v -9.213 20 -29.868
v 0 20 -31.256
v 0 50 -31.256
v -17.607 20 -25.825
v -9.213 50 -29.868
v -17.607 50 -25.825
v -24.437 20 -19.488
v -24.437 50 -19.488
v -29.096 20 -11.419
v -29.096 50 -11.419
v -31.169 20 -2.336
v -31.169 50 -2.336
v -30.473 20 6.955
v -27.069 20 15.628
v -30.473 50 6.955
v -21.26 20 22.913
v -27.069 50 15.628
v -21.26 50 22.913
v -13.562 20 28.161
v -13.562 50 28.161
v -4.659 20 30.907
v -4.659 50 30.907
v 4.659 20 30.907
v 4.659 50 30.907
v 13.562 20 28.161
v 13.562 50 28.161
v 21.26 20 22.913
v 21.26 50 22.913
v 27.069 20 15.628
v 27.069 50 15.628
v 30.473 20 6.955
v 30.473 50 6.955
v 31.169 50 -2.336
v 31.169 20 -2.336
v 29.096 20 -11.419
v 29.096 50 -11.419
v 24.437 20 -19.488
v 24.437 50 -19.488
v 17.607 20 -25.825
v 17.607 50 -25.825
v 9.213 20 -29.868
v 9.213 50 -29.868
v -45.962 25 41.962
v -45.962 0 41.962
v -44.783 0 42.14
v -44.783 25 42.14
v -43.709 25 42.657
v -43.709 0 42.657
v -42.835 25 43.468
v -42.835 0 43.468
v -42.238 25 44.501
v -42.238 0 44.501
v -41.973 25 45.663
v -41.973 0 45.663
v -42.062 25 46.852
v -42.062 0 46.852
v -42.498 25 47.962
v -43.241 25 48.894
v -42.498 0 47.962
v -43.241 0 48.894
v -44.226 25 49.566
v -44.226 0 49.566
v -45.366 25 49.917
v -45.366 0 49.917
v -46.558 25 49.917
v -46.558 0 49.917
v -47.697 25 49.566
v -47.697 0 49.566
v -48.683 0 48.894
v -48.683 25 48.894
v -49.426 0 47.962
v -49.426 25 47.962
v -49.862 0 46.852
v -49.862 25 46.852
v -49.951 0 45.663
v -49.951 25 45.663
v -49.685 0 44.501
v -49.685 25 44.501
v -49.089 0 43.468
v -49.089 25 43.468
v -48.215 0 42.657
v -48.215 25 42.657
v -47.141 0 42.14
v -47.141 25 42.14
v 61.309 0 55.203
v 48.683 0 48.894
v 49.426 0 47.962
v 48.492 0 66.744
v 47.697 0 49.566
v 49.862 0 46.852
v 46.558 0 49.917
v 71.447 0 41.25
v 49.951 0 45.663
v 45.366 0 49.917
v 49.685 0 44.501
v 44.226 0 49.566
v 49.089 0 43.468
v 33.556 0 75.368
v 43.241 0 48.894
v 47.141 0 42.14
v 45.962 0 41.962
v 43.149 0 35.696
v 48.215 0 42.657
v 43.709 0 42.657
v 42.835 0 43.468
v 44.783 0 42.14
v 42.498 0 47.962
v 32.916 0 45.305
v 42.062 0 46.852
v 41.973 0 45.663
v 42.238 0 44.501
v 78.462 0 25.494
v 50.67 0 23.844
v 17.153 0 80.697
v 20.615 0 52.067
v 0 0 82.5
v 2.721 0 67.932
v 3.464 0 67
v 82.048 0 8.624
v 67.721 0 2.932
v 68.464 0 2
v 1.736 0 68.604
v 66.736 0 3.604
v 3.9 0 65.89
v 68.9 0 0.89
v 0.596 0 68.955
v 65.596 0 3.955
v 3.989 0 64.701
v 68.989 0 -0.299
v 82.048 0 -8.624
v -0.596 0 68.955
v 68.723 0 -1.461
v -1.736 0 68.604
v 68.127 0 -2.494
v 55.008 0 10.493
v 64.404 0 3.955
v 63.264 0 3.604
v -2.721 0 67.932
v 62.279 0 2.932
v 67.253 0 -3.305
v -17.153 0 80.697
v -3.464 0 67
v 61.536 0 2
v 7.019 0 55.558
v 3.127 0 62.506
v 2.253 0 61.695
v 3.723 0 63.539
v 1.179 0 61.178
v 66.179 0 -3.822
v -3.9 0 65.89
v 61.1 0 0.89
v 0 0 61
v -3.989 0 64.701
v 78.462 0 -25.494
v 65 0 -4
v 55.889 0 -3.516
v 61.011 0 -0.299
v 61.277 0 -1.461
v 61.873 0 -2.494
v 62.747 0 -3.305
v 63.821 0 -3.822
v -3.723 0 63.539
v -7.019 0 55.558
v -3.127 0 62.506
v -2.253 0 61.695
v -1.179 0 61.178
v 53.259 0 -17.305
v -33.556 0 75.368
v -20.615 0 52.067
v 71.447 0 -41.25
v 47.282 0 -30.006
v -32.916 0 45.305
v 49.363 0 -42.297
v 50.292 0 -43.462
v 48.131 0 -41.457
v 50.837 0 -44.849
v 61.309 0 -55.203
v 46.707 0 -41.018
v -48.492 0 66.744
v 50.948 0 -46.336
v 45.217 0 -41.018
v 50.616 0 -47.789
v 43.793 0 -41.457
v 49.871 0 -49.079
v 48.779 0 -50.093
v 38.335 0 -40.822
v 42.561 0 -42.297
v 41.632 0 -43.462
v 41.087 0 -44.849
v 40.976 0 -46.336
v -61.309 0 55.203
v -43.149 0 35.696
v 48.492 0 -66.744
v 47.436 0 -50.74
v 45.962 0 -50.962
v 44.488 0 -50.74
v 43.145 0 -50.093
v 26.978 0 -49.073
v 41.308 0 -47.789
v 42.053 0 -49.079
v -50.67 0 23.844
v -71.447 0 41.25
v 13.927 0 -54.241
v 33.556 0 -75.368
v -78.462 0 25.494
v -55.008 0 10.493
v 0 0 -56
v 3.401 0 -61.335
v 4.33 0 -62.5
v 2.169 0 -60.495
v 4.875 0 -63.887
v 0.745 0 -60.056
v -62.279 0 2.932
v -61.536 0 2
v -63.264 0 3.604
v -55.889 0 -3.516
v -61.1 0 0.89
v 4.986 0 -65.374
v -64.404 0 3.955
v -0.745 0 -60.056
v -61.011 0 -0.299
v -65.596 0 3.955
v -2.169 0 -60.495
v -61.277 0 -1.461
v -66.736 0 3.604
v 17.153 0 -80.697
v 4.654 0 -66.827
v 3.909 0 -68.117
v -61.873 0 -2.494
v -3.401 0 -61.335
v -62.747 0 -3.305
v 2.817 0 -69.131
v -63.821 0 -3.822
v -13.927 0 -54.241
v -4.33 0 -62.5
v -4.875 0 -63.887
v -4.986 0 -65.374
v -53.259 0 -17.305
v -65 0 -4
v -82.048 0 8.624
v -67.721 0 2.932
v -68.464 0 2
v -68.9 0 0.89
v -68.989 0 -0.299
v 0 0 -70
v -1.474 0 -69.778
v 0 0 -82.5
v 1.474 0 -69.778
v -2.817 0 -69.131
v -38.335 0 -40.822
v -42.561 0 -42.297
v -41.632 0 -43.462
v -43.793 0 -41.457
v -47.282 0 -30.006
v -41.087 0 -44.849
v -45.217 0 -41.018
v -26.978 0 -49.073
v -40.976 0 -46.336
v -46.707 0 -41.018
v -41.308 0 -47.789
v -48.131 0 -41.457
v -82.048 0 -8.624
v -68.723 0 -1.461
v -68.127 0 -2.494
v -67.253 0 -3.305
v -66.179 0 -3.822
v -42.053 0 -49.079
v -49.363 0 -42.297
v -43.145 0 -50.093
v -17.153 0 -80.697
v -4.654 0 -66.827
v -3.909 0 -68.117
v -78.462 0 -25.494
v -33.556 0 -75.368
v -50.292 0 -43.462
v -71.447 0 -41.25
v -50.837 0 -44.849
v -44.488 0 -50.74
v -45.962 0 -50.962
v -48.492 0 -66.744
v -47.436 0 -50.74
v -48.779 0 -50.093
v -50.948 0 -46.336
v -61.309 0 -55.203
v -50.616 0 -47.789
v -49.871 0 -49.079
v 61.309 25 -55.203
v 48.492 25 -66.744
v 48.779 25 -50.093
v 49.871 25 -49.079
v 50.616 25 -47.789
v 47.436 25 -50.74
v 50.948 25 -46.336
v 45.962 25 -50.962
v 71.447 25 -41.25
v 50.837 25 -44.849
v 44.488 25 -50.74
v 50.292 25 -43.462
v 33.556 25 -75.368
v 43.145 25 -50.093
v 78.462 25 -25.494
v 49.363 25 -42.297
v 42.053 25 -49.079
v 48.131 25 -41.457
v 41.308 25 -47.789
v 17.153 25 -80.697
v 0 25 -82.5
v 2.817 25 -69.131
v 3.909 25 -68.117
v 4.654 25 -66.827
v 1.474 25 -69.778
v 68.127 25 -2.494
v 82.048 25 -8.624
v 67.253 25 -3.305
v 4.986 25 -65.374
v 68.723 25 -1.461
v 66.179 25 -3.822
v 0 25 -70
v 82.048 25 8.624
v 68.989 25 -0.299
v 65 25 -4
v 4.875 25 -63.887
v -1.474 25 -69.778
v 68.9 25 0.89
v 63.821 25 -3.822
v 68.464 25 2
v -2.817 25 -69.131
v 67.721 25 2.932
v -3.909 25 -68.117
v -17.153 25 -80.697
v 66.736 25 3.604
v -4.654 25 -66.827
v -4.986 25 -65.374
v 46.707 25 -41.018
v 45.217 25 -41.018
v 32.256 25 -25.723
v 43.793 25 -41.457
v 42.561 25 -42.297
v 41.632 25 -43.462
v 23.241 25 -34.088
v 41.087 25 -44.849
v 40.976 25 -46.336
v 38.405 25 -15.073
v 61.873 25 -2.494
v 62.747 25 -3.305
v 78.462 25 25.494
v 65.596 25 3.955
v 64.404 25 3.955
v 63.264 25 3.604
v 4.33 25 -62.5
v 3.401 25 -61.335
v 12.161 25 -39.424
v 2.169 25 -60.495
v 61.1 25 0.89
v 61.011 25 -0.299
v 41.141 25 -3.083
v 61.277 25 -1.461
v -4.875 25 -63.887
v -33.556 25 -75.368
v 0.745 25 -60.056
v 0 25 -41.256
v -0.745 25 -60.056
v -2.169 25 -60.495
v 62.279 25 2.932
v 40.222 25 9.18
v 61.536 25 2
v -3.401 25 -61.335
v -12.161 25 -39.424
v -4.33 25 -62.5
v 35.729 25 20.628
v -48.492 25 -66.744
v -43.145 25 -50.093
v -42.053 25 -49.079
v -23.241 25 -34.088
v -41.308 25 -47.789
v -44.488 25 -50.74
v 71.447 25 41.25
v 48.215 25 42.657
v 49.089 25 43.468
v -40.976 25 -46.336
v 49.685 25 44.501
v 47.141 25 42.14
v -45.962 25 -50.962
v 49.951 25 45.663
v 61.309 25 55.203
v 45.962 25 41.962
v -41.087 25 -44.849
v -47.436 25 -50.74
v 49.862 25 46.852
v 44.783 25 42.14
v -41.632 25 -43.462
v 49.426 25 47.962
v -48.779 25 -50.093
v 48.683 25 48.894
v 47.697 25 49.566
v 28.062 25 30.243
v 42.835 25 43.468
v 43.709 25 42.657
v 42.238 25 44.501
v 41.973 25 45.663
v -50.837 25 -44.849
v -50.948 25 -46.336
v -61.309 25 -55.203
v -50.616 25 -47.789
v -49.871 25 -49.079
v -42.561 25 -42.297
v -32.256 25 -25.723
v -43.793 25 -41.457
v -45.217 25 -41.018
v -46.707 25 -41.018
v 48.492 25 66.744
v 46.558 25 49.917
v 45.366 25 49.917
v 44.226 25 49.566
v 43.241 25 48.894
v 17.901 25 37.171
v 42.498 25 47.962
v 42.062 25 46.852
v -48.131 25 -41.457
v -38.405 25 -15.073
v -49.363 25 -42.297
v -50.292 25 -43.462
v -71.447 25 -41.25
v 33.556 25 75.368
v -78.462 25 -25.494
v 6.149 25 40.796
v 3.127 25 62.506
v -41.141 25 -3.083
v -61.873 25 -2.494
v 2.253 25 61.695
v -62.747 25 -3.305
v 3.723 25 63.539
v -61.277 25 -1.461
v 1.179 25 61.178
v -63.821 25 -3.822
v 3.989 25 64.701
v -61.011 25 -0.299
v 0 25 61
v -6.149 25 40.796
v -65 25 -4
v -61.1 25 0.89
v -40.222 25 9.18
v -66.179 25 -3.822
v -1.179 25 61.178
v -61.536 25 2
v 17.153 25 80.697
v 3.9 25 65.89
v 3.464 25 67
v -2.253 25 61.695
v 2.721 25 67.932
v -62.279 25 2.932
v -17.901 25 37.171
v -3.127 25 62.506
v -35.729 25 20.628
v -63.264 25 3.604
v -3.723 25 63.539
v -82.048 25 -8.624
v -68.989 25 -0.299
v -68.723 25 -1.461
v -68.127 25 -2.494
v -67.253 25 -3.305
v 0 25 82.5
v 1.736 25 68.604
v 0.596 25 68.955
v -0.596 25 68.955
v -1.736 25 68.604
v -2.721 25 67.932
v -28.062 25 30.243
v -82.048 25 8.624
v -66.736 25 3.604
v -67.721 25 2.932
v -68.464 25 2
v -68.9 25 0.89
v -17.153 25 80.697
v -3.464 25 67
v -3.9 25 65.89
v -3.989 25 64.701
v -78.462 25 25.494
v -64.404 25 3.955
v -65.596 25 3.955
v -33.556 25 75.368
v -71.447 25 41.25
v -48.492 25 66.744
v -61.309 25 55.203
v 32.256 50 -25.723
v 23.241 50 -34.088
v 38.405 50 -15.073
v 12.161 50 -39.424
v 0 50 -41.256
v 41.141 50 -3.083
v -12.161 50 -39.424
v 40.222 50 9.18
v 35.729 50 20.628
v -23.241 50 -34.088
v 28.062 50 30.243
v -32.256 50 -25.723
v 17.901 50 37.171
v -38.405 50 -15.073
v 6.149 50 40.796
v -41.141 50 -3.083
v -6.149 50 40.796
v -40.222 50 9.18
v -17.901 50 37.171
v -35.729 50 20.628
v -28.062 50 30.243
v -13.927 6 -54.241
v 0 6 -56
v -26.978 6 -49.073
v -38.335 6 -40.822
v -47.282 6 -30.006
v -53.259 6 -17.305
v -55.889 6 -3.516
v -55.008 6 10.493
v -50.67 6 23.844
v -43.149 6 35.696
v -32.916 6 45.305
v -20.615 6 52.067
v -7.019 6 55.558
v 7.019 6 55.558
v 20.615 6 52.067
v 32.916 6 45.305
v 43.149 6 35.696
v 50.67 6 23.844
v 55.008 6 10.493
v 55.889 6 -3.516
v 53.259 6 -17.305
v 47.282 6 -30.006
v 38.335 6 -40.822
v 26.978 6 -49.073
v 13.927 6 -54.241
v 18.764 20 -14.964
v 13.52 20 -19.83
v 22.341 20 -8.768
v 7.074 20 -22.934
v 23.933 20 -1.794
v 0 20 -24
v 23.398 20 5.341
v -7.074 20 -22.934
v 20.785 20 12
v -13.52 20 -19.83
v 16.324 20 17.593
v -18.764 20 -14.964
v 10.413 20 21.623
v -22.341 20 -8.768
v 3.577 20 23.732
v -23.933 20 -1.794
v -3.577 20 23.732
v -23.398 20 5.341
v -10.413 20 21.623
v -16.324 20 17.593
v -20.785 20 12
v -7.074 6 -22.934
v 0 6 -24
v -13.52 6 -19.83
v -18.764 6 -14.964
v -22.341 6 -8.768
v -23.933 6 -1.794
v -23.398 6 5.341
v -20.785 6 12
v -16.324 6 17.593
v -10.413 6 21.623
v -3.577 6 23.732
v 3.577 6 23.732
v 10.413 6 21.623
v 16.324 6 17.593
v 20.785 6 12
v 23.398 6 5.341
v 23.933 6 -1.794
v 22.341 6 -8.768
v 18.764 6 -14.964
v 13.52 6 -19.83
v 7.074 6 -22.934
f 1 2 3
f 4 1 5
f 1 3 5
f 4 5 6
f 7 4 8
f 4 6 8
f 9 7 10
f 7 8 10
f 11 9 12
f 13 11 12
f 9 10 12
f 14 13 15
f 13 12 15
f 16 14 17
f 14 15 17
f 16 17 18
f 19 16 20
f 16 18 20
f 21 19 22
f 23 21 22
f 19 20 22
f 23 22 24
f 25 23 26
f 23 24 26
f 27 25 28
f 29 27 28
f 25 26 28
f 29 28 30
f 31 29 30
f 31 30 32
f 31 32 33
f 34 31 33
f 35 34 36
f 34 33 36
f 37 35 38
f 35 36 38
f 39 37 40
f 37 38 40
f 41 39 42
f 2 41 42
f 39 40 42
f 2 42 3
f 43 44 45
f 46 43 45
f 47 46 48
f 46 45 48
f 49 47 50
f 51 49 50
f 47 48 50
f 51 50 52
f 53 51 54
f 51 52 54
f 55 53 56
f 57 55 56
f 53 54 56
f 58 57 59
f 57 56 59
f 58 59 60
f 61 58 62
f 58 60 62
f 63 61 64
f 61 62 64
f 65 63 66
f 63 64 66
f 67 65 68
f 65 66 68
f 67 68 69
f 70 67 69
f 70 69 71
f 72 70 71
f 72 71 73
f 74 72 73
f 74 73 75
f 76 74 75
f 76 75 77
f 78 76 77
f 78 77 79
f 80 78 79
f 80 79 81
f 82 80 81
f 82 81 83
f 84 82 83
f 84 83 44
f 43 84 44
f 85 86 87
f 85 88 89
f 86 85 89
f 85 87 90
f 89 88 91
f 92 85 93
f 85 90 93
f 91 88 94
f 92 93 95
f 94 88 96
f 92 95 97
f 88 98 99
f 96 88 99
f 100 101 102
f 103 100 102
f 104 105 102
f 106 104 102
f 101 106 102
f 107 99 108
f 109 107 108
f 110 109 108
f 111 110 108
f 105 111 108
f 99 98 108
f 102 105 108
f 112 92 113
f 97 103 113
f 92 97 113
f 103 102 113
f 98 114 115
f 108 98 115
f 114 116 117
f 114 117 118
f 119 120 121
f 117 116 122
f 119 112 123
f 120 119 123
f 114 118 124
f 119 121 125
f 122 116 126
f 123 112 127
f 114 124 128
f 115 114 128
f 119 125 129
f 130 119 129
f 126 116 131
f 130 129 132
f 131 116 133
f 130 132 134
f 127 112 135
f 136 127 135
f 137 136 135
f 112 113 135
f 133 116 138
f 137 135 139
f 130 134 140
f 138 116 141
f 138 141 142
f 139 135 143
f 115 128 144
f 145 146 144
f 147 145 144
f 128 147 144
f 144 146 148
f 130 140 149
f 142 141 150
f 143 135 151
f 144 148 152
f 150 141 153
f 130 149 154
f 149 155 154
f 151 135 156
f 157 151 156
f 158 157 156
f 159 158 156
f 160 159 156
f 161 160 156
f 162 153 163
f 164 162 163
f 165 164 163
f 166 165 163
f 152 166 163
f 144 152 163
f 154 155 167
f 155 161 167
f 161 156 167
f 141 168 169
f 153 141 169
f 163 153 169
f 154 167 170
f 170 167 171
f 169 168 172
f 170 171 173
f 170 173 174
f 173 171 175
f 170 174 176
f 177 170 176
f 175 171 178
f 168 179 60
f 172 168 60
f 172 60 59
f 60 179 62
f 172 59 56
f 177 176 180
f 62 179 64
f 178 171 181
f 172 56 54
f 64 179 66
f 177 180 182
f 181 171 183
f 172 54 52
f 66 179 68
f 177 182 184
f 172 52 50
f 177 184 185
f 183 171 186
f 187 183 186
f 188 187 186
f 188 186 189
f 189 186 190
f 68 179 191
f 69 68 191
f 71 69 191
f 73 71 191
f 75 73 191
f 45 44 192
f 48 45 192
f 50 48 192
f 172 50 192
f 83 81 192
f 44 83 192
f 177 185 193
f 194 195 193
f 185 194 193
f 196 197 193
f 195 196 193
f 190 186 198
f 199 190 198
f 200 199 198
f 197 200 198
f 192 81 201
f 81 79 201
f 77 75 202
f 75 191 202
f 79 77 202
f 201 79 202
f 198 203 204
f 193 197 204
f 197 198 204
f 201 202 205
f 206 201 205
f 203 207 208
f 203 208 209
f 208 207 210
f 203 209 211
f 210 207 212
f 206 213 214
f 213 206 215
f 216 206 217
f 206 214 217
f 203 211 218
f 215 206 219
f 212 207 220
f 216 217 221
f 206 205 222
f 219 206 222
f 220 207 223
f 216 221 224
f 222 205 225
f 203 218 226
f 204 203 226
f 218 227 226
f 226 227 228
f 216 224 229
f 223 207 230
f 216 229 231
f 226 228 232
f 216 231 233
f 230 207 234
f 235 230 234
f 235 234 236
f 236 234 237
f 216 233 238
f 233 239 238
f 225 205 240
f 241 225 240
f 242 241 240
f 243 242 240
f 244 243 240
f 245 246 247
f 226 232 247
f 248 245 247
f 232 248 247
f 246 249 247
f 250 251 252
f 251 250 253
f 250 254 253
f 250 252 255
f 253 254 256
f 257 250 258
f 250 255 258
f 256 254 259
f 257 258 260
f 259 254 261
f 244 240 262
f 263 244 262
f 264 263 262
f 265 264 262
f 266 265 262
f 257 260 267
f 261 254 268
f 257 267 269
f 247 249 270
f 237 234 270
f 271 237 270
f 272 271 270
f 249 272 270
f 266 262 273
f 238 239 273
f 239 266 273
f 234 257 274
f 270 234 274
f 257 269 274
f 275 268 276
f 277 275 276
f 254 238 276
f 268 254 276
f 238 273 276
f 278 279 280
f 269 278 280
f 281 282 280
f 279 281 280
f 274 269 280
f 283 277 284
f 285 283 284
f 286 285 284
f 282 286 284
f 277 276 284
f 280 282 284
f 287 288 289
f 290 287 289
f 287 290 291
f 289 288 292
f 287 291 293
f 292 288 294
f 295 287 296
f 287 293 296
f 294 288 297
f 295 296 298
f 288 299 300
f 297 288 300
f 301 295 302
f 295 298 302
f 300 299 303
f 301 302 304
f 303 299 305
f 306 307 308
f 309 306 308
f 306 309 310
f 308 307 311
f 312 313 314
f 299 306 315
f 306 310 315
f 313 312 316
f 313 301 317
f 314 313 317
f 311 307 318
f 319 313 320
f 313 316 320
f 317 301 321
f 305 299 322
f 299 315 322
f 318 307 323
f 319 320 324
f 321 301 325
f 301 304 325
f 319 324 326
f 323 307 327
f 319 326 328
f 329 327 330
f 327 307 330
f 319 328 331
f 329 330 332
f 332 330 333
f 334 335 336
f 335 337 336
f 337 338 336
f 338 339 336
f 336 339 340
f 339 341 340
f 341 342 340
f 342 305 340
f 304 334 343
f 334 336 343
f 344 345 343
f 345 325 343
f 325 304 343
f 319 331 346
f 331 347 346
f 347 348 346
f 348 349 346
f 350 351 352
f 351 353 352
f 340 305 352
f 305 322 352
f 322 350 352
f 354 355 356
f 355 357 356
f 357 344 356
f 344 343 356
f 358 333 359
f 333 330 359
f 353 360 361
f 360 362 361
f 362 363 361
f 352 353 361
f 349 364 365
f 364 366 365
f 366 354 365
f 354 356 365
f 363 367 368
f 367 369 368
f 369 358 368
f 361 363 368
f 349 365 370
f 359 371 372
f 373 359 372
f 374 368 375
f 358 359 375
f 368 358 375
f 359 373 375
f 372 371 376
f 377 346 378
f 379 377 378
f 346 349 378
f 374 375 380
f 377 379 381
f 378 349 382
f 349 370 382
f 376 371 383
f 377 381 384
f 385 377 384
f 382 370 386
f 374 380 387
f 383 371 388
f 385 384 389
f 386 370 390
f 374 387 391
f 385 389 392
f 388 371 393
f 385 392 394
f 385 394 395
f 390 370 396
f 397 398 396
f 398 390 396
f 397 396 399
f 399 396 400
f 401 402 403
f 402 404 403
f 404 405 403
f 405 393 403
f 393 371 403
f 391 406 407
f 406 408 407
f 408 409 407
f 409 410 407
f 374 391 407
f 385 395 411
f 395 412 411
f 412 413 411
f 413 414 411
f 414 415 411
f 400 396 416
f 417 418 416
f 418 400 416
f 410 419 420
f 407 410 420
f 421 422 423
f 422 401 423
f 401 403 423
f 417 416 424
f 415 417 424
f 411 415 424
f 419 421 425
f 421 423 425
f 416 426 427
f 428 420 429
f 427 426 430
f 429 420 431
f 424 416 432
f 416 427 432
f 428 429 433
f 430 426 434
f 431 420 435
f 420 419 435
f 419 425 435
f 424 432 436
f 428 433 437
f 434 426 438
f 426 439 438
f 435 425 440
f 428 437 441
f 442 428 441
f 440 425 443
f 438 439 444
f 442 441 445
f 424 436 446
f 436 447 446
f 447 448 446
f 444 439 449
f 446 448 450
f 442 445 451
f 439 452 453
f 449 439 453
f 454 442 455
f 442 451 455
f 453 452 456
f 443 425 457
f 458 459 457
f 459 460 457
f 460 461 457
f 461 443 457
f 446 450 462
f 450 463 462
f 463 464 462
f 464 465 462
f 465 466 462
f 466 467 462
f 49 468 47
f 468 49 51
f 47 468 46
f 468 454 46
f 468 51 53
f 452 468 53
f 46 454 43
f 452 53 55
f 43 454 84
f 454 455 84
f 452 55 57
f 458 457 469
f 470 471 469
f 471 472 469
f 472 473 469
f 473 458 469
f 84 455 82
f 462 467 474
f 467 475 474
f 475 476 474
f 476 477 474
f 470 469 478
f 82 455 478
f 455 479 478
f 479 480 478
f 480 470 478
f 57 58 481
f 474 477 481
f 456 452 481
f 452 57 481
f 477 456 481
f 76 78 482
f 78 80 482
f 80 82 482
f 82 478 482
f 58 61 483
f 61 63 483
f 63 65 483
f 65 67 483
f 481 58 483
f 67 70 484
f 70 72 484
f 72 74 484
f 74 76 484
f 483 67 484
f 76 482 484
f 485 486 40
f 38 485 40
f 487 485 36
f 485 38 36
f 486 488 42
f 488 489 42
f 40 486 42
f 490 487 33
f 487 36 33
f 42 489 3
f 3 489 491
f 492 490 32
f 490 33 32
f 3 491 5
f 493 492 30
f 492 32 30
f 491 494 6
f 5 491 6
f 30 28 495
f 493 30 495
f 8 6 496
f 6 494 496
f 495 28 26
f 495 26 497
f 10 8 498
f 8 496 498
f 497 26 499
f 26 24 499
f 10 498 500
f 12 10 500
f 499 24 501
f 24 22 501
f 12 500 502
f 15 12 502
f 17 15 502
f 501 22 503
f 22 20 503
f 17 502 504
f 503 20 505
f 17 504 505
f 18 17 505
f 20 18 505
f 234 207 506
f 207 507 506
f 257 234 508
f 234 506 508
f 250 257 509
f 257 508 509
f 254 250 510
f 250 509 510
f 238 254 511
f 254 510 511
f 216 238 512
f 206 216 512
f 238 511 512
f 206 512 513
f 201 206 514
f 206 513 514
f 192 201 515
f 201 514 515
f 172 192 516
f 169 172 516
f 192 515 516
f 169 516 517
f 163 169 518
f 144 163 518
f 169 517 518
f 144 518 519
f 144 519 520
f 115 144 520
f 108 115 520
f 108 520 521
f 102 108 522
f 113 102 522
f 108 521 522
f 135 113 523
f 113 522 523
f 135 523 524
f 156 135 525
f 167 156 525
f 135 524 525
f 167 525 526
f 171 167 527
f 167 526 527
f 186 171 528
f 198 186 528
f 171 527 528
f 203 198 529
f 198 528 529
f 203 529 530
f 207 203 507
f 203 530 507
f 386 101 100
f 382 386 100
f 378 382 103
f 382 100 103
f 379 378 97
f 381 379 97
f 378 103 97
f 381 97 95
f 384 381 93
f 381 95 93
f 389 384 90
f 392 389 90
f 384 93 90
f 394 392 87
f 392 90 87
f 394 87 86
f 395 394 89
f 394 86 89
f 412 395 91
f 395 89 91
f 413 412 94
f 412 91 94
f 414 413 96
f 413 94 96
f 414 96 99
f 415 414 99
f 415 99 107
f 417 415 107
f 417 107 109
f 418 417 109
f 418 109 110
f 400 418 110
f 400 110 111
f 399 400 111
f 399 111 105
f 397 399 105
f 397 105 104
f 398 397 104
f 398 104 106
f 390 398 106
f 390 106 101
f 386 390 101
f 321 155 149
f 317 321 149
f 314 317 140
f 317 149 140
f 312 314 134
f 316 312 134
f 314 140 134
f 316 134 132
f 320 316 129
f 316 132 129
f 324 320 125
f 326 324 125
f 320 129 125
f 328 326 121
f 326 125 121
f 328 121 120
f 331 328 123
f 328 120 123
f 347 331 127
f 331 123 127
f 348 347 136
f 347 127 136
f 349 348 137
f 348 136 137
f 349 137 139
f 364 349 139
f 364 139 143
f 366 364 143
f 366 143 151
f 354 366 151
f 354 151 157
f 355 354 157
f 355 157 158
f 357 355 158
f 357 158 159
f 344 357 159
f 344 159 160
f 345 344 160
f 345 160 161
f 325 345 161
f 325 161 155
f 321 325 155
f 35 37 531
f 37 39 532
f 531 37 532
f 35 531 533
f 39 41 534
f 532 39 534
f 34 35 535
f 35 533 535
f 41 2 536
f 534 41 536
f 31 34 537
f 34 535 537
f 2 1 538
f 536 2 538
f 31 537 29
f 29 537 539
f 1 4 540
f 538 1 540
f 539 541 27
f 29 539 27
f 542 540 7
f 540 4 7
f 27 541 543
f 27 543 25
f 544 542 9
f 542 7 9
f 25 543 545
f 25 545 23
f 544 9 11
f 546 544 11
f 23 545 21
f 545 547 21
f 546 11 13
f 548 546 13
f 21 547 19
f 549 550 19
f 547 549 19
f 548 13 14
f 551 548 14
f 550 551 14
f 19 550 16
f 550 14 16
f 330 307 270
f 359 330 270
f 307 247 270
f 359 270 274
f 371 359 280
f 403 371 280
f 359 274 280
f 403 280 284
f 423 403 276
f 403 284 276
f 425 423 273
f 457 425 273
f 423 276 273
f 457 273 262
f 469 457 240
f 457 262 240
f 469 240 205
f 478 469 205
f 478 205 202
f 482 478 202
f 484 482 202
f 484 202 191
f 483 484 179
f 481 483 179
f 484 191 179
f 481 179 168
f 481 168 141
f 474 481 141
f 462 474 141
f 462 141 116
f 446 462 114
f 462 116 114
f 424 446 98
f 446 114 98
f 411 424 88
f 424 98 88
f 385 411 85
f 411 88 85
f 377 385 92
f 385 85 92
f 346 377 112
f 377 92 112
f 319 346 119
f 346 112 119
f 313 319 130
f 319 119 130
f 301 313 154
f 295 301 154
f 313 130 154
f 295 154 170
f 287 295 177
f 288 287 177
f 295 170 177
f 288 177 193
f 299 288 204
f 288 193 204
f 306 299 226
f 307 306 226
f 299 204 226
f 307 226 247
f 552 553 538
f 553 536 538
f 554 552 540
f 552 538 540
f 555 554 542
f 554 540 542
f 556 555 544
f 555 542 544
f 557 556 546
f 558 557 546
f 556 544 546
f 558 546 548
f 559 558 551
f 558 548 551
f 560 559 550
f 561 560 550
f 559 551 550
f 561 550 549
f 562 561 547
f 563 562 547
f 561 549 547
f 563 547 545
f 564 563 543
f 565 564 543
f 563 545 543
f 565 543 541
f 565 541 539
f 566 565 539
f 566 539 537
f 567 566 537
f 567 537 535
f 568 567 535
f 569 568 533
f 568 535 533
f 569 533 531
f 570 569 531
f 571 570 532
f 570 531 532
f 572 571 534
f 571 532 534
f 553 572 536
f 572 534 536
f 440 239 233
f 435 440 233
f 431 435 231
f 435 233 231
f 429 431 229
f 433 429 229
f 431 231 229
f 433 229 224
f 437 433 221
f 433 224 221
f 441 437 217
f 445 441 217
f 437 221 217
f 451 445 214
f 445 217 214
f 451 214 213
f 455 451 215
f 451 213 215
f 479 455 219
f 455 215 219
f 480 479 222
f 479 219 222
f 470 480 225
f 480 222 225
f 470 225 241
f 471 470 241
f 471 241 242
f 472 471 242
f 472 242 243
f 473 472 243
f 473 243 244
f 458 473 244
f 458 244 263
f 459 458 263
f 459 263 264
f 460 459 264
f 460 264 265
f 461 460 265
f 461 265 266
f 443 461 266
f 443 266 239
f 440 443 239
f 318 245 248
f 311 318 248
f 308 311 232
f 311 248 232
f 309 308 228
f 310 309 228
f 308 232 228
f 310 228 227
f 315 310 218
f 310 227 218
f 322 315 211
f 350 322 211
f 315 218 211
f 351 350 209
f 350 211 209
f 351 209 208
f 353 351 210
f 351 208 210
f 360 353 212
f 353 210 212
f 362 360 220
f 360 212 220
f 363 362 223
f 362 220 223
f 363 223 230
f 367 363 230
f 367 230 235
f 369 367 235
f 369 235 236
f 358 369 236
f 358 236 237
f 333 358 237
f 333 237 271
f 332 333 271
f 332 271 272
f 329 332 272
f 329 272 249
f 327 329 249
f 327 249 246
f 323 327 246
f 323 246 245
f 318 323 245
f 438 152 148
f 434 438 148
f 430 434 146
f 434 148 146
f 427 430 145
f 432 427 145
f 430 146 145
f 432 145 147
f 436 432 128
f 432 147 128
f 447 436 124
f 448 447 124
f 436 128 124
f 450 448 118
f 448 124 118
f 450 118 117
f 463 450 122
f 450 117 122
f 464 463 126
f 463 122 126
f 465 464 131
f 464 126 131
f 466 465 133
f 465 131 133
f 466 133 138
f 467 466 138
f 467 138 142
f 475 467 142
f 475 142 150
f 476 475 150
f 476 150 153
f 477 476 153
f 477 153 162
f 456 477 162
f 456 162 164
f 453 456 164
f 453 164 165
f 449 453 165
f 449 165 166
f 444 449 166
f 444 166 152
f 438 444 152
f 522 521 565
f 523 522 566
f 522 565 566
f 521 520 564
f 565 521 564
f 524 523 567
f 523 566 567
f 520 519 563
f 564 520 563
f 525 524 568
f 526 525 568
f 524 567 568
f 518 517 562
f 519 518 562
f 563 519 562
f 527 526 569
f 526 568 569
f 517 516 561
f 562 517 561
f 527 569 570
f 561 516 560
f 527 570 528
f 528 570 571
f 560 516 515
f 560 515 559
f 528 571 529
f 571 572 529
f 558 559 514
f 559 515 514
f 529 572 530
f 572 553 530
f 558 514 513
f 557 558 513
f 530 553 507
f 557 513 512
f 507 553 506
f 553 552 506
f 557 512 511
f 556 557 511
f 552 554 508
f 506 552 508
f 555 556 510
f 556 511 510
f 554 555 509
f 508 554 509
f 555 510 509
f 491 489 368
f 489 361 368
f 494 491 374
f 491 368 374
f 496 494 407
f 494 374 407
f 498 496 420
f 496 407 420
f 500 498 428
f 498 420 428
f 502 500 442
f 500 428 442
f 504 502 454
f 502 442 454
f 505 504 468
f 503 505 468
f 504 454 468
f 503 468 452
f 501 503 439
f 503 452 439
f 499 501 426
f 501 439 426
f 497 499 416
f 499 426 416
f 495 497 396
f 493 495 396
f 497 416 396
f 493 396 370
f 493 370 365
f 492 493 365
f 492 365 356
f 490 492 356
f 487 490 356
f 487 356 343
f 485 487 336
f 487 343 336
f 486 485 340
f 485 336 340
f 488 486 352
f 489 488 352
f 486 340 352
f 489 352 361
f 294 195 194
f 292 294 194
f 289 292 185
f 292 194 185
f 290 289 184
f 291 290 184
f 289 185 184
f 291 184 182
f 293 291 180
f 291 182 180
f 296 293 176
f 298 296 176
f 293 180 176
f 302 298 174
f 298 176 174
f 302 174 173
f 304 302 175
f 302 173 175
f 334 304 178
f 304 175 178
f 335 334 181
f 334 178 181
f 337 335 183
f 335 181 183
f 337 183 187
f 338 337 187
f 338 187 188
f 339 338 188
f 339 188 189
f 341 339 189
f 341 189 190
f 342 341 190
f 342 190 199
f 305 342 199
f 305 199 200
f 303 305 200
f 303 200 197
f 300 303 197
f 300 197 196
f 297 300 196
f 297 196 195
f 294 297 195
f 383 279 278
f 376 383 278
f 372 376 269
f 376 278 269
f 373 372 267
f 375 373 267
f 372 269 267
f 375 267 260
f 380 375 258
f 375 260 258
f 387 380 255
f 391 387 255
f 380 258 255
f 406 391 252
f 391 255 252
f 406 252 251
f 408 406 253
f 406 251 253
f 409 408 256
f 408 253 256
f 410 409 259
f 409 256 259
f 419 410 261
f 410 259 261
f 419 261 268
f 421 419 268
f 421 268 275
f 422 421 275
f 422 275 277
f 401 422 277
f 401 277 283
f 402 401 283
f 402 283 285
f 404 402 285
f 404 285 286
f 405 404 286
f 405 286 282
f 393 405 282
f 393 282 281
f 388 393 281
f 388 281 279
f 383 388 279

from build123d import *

# Parameters (mm, degrees)
SKETCH3_R          = 4
SKETCH3_R_2        = 5
CUT_EXTRUDE2_DEPTH = 127.935022748


with BuildPart() as part:
    # Sketch2 → Revolve1 (revolve)
    with BuildSketch(Plane.XY, mode=Mode.PRIVATE) as revolve1_sk:
        Polygon((82.5, 0), (56, 0), (56, 6), (24, 6), (24, 20), (31.256462168, 20), (31.256462168, 50), (41.256462168, 50), (41.256462168, 25), (82.5, 25), align=None)
    revolve(revolve1_sk.sketch.rotate(Axis((0, 0, 0), (0, 1, 0)), 90), axis=Axis((0, 0, 0), (0, 1, 0)))

    # Sketch3 → Cut-Extrude2 (cut, through all)
    with BuildSketch(Plane.XZ):
        with Locations(Location((65, 0, 0), (0, 0, 270))):
            Circle(SKETCH3_R)
        with Locations(Location((45.961940777, -45.961940777, 0), (0, 0, 270))):
            Circle(SKETCH3_R_2)
        with Locations(Location((0, -65, 0), (0, 0, 270))):
            Circle(SKETCH3_R_2)
        with Locations(Location((-45.961940777, -45.961940777, 0), (0, 0, 270))):
            Circle(SKETCH3_R_2)
        with Locations(Location((-65, 0, 0), (0, 0, 270))):
            Circle(SKETCH3_R)
        with Locations(Location((-45.961940777, 45.961940777, 0), (0, 0, 270))):
            Circle(SKETCH3_R)
        with Locations(Location((0, 65, 0), (0, 0, 270))):
            Circle(SKETCH3_R)
        with Locations(Location((45.961940777, 45.961940777, 0), (0, 0, 270))):
            Circle(SKETCH3_R)
    extrude(amount=-CUT_EXTRUDE2_DEPTH, mode=Mode.SUBTRACT)


solid = part.part
